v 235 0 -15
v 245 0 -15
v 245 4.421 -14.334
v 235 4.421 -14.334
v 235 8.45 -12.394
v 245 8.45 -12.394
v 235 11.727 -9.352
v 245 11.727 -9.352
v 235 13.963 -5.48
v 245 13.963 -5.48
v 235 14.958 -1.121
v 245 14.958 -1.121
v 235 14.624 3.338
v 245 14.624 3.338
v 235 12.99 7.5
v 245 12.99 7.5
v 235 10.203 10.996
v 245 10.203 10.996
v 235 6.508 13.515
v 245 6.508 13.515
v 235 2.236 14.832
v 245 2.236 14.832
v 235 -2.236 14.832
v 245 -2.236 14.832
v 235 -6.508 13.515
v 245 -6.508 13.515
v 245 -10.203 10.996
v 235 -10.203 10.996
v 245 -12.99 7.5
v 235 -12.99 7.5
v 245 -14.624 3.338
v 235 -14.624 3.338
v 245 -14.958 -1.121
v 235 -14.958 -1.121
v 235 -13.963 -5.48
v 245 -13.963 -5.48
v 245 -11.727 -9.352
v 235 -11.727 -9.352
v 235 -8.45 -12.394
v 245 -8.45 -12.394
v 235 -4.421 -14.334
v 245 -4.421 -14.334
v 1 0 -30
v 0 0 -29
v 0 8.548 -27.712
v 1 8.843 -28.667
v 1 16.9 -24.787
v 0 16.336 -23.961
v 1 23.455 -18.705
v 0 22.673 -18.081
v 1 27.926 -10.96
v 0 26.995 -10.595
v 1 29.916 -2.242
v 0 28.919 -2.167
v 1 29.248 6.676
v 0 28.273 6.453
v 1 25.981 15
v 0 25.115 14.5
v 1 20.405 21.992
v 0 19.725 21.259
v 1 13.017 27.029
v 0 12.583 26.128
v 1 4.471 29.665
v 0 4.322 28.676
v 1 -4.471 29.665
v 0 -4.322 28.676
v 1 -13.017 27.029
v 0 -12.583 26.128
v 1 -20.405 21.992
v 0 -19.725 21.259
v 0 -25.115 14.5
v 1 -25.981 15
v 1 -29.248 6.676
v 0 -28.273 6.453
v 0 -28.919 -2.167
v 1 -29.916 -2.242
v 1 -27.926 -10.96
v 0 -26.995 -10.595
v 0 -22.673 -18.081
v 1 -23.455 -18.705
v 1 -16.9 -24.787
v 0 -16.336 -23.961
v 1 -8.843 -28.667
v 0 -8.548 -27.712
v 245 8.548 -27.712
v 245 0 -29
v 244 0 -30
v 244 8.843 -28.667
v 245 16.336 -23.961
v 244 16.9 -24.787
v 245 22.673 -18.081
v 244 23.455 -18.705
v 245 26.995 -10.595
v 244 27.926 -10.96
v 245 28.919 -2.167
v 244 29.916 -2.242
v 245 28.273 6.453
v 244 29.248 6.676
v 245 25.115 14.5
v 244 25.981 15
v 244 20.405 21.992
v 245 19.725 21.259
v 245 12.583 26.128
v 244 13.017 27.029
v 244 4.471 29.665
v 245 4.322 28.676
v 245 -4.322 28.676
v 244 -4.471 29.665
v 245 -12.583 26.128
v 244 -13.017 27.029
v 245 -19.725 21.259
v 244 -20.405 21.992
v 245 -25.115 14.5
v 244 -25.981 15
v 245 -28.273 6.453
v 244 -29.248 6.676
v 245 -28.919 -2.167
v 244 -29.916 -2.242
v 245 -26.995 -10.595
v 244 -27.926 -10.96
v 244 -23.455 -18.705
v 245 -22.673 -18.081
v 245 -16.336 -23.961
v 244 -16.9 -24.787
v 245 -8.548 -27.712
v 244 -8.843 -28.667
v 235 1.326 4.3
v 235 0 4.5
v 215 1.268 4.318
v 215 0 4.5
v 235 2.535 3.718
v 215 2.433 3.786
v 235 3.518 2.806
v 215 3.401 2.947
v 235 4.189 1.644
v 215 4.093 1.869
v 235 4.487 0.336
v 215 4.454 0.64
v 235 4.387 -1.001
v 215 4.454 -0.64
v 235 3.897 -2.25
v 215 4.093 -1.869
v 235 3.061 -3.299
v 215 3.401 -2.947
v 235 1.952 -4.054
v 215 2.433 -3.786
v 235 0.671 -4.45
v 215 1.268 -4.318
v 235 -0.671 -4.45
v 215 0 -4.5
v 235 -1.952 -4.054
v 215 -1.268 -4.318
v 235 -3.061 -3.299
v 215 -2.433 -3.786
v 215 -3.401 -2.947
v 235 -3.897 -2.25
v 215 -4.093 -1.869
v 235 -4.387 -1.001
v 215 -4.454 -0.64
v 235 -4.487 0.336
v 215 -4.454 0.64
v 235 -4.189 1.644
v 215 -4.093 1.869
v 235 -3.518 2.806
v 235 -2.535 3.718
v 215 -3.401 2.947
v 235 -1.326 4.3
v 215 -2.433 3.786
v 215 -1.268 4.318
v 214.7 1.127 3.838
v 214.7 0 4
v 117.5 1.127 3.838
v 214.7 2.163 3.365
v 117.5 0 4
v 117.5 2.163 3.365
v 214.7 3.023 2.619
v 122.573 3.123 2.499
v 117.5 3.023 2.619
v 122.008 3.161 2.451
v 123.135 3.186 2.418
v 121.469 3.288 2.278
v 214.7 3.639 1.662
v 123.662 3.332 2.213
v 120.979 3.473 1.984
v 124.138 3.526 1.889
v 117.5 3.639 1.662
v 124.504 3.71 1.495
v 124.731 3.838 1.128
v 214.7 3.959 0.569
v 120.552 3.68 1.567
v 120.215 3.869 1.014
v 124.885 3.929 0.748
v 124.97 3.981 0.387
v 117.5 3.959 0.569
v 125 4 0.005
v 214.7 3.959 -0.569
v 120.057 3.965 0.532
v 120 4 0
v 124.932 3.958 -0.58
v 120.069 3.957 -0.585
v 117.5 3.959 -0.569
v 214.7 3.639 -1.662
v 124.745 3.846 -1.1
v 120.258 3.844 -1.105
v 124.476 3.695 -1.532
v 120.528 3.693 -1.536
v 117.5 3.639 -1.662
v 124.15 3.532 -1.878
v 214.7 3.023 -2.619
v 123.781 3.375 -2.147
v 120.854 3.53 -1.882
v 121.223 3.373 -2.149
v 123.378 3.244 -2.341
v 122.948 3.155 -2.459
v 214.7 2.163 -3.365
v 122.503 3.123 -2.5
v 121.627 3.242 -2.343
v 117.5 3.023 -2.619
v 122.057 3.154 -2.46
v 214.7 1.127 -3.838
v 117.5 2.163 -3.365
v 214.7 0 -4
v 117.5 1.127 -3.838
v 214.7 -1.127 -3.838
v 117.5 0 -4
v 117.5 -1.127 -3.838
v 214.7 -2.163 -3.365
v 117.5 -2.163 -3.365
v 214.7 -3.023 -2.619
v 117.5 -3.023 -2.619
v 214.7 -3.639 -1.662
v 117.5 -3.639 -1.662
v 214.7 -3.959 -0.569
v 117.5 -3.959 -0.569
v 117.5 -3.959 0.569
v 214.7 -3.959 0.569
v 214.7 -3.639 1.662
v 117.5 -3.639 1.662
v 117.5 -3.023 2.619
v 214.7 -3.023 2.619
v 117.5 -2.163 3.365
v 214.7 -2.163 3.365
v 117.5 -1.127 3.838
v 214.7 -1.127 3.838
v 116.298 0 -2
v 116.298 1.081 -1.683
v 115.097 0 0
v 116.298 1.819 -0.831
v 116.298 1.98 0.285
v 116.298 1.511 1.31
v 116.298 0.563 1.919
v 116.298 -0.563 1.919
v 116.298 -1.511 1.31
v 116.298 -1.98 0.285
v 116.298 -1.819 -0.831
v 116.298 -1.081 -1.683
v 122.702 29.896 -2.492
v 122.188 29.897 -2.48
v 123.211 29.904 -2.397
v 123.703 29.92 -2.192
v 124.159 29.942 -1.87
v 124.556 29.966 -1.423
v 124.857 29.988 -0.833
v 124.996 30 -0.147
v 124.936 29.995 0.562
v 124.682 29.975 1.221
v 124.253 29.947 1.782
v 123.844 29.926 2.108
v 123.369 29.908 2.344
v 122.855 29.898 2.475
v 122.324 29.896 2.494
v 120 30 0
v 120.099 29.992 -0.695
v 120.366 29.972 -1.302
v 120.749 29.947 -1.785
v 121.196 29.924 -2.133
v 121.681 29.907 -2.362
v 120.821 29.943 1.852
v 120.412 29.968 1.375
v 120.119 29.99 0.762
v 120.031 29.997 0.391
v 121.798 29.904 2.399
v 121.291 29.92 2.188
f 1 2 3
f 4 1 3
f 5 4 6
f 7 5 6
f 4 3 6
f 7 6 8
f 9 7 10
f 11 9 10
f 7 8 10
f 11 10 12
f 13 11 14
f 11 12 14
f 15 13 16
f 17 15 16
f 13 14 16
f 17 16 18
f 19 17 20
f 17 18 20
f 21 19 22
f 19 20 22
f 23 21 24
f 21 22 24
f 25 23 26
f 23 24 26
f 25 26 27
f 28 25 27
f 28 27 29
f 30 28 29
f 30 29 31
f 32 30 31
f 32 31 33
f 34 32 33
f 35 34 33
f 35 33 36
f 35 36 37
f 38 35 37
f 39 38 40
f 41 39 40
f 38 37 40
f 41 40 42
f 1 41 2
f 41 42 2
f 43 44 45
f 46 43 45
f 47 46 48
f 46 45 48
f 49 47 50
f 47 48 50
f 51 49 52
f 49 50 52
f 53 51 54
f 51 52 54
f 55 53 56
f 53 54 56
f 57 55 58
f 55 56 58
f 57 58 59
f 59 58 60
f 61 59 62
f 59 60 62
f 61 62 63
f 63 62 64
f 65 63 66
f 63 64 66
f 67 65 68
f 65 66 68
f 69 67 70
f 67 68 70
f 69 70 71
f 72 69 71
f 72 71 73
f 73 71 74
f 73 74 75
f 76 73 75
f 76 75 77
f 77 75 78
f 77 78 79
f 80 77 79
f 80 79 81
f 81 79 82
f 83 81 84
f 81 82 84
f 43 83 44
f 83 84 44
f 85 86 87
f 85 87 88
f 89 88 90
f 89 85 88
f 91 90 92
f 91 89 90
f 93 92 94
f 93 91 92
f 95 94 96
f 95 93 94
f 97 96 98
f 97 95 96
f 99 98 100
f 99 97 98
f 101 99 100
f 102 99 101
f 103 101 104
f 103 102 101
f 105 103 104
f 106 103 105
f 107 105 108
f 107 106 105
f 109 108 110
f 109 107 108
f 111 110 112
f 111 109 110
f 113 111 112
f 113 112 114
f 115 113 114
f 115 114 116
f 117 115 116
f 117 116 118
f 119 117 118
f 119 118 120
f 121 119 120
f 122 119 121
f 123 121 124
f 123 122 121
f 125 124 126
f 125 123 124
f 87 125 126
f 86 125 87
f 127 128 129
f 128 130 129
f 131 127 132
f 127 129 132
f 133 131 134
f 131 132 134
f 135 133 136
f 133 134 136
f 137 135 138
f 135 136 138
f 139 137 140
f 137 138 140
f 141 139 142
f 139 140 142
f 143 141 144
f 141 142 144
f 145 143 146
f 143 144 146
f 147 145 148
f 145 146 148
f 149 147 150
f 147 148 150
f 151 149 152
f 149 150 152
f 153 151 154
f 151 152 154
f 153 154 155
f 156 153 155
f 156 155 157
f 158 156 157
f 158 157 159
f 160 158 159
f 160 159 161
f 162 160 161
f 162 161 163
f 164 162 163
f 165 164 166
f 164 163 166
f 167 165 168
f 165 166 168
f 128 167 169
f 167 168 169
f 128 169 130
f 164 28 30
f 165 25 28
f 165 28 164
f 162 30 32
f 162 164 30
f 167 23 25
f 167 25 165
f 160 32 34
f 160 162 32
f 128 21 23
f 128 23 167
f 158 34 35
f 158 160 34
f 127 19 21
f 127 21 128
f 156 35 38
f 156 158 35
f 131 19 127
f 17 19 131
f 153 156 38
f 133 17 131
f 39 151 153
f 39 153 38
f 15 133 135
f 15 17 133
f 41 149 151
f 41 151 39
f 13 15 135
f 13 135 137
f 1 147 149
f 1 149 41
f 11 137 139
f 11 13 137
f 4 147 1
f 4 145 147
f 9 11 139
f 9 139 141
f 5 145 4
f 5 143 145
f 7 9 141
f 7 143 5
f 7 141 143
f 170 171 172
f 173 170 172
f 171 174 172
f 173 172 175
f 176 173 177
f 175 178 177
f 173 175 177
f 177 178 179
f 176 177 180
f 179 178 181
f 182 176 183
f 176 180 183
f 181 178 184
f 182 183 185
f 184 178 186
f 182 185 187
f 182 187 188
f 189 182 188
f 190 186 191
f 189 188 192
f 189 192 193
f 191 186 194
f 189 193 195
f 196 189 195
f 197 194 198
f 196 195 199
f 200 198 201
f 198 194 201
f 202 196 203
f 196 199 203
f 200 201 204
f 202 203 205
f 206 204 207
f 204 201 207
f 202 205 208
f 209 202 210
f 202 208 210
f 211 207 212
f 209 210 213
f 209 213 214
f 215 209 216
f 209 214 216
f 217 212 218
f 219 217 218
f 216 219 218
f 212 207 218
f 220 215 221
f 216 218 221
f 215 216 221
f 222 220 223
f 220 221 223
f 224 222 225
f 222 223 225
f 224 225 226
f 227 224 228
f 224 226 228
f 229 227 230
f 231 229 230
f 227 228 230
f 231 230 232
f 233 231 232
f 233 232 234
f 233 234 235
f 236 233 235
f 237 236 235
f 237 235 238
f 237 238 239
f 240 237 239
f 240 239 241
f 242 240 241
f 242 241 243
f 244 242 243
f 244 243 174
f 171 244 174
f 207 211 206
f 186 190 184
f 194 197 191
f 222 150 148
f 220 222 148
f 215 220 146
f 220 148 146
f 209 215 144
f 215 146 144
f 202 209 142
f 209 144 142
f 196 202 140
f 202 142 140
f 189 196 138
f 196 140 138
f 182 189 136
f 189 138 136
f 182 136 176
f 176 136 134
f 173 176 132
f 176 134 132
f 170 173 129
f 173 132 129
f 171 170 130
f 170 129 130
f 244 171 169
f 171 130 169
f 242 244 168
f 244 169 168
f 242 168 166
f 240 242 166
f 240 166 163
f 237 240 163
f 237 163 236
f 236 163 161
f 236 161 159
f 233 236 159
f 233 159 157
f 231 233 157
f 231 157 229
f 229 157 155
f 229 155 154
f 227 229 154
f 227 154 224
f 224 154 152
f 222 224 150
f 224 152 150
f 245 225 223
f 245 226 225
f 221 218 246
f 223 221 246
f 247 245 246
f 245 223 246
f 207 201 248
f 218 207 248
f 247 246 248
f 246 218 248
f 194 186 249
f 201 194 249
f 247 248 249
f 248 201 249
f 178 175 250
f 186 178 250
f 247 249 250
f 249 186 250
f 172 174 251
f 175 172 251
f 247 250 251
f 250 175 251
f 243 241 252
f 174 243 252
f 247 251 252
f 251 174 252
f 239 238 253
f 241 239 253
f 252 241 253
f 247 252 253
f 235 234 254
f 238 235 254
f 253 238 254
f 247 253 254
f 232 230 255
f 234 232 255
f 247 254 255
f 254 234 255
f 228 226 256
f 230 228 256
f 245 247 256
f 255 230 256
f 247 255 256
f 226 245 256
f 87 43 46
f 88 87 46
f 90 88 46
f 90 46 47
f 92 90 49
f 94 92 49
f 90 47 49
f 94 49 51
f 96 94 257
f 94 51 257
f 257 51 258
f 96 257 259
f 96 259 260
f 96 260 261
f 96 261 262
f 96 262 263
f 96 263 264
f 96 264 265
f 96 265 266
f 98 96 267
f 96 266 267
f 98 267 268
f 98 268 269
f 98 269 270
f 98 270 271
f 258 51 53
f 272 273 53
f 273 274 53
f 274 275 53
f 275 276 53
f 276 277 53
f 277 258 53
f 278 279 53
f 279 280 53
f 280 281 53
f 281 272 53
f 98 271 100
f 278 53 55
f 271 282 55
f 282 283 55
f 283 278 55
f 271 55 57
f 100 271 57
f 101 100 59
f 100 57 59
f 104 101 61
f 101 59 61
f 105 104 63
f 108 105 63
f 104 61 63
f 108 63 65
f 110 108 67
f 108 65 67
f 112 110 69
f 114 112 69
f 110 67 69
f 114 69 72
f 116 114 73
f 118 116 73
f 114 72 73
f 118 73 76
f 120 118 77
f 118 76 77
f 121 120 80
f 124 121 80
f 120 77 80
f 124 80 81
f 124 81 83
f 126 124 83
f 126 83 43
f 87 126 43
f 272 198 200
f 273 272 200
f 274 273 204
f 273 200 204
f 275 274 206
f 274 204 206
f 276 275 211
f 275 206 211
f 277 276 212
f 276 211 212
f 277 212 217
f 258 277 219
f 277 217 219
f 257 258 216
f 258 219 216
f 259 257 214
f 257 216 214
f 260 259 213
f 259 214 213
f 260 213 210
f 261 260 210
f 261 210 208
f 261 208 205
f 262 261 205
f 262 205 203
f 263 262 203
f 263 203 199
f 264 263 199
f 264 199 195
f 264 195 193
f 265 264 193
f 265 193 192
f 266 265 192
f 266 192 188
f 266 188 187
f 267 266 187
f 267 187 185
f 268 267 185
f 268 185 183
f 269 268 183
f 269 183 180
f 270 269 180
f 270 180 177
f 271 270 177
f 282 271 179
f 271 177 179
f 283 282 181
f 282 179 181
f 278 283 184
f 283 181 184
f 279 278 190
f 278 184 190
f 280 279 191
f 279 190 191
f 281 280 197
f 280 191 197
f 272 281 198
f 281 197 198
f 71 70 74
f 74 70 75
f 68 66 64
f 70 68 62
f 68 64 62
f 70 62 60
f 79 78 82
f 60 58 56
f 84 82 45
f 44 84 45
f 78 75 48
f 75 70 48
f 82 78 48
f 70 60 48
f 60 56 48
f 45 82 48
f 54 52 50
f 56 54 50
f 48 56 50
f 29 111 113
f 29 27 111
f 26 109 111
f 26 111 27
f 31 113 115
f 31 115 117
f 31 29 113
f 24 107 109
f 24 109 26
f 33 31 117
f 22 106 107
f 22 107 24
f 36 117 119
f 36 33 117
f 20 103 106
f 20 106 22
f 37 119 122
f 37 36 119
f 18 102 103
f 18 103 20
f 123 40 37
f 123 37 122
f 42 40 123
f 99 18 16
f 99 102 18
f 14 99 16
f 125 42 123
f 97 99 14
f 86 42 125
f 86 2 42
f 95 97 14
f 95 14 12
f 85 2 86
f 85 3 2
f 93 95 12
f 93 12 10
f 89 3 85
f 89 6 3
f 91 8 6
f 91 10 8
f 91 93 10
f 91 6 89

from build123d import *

# Parameters (mm, degrees)
SKETCH_1_R                = 30
EXTRUDE_1_DEPTH           = 245
CHAMFER_1_SIZE            = 1
SKETCH_2_R                = 15
CUT_EXTRUDE_1_DEPTH       = 10
HOLE_WIZARD_8_0_8_1_D     = 8
HOLE_WIZARD_8_0_8_1_DEPTH = 117.5
HOLE_WIZARD_8_0_8_1_TIP   = 2.403442476
M10X1_0_1_D               = 9
M10X1_0_1_DEPTH           = 20
M10X1_0_1_TIP             = 2.703872786
HOLE_WIZARD_5_0_5_1_D     = 5
HOLE_WIZARD_5_0_5_1_DEPTH = 30
HOLE_WIZARD_5_0_5_1_TIP   = 1.502151548


with BuildPart() as part:
    # 草图1 → 凸台-拉伸1 (new body)
    with BuildSketch(Plane(origin=(0, 0, 0), x_dir=(0, 0, -1), z_dir=(1, 0, 0))):
        Circle(SKETCH_1_R)
    extrude(amount=EXTRUDE_1_DEPTH)

    # 倒角1
    chamfer_1_edges = [part.edges().sort_by_distance(p)[0] for p in [
        (0, 0, 30),
        (245, 0, 30),
    ]]
    chamfer(chamfer_1_edges, length=CHAMFER_1_SIZE)

    # 草图2 → 切除-拉伸1 (cut)
    with BuildSketch(Plane(origin=(245, 0, 0), x_dir=(0, 0, -1), z_dir=(1, 0, 0))):
        Circle(SKETCH_2_R)
    extrude(amount=-CUT_EXTRUDE_1_DEPTH, mode=Mode.SUBTRACT)

    # Ø8.0 (8) 直径孔1
    with Locations(Plane(origin=(235, 0, 0), x_dir=(0, 0, -1), z_dir=(1, 0, 0))):
        with Locations((0, 0)):
            Hole(HOLE_WIZARD_8_0_8_1_D / 2, depth=HOLE_WIZARD_8_0_8_1_DEPTH)
            with Locations((0, 0, -(HOLE_WIZARD_8_0_8_1_DEPTH + HOLE_WIZARD_8_0_8_1_TIP / 2))):  # 118° drill point
                Cone(0, HOLE_WIZARD_8_0_8_1_D / 2, HOLE_WIZARD_8_0_8_1_TIP, mode=Mode.SUBTRACT)

    # M10x1.0 螺纹孔1
    with Locations(Plane(origin=(235, 0, 0), x_dir=(0, 0, -1), z_dir=(1, 0, 0))):
        with Locations((0, 0)):
            Hole(M10X1_0_1_D / 2, depth=M10X1_0_1_DEPTH)
            with Locations((0, 0, -(M10X1_0_1_DEPTH + M10X1_0_1_TIP / 2))):  # 118° drill point
                Cone(0, M10X1_0_1_D / 2, M10X1_0_1_TIP, mode=Mode.SUBTRACT)

    # Ø5.0 (5) 直径孔1
    with Locations(Plane(origin=(0, 30, 0), x_dir=(1, 0, 0), z_dir=(0, 1, 0))):
        with Locations((122.5, 0)):
            Hole(HOLE_WIZARD_5_0_5_1_D / 2, depth=HOLE_WIZARD_5_0_5_1_DEPTH)
            with Locations((0, 0, -(HOLE_WIZARD_5_0_5_1_DEPTH + HOLE_WIZARD_5_0_5_1_TIP / 2))):  # 118° drill point
                Cone(0, HOLE_WIZARD_5_0_5_1_D / 2, HOLE_WIZARD_5_0_5_1_TIP, mode=Mode.SUBTRACT)


solid = part.part
